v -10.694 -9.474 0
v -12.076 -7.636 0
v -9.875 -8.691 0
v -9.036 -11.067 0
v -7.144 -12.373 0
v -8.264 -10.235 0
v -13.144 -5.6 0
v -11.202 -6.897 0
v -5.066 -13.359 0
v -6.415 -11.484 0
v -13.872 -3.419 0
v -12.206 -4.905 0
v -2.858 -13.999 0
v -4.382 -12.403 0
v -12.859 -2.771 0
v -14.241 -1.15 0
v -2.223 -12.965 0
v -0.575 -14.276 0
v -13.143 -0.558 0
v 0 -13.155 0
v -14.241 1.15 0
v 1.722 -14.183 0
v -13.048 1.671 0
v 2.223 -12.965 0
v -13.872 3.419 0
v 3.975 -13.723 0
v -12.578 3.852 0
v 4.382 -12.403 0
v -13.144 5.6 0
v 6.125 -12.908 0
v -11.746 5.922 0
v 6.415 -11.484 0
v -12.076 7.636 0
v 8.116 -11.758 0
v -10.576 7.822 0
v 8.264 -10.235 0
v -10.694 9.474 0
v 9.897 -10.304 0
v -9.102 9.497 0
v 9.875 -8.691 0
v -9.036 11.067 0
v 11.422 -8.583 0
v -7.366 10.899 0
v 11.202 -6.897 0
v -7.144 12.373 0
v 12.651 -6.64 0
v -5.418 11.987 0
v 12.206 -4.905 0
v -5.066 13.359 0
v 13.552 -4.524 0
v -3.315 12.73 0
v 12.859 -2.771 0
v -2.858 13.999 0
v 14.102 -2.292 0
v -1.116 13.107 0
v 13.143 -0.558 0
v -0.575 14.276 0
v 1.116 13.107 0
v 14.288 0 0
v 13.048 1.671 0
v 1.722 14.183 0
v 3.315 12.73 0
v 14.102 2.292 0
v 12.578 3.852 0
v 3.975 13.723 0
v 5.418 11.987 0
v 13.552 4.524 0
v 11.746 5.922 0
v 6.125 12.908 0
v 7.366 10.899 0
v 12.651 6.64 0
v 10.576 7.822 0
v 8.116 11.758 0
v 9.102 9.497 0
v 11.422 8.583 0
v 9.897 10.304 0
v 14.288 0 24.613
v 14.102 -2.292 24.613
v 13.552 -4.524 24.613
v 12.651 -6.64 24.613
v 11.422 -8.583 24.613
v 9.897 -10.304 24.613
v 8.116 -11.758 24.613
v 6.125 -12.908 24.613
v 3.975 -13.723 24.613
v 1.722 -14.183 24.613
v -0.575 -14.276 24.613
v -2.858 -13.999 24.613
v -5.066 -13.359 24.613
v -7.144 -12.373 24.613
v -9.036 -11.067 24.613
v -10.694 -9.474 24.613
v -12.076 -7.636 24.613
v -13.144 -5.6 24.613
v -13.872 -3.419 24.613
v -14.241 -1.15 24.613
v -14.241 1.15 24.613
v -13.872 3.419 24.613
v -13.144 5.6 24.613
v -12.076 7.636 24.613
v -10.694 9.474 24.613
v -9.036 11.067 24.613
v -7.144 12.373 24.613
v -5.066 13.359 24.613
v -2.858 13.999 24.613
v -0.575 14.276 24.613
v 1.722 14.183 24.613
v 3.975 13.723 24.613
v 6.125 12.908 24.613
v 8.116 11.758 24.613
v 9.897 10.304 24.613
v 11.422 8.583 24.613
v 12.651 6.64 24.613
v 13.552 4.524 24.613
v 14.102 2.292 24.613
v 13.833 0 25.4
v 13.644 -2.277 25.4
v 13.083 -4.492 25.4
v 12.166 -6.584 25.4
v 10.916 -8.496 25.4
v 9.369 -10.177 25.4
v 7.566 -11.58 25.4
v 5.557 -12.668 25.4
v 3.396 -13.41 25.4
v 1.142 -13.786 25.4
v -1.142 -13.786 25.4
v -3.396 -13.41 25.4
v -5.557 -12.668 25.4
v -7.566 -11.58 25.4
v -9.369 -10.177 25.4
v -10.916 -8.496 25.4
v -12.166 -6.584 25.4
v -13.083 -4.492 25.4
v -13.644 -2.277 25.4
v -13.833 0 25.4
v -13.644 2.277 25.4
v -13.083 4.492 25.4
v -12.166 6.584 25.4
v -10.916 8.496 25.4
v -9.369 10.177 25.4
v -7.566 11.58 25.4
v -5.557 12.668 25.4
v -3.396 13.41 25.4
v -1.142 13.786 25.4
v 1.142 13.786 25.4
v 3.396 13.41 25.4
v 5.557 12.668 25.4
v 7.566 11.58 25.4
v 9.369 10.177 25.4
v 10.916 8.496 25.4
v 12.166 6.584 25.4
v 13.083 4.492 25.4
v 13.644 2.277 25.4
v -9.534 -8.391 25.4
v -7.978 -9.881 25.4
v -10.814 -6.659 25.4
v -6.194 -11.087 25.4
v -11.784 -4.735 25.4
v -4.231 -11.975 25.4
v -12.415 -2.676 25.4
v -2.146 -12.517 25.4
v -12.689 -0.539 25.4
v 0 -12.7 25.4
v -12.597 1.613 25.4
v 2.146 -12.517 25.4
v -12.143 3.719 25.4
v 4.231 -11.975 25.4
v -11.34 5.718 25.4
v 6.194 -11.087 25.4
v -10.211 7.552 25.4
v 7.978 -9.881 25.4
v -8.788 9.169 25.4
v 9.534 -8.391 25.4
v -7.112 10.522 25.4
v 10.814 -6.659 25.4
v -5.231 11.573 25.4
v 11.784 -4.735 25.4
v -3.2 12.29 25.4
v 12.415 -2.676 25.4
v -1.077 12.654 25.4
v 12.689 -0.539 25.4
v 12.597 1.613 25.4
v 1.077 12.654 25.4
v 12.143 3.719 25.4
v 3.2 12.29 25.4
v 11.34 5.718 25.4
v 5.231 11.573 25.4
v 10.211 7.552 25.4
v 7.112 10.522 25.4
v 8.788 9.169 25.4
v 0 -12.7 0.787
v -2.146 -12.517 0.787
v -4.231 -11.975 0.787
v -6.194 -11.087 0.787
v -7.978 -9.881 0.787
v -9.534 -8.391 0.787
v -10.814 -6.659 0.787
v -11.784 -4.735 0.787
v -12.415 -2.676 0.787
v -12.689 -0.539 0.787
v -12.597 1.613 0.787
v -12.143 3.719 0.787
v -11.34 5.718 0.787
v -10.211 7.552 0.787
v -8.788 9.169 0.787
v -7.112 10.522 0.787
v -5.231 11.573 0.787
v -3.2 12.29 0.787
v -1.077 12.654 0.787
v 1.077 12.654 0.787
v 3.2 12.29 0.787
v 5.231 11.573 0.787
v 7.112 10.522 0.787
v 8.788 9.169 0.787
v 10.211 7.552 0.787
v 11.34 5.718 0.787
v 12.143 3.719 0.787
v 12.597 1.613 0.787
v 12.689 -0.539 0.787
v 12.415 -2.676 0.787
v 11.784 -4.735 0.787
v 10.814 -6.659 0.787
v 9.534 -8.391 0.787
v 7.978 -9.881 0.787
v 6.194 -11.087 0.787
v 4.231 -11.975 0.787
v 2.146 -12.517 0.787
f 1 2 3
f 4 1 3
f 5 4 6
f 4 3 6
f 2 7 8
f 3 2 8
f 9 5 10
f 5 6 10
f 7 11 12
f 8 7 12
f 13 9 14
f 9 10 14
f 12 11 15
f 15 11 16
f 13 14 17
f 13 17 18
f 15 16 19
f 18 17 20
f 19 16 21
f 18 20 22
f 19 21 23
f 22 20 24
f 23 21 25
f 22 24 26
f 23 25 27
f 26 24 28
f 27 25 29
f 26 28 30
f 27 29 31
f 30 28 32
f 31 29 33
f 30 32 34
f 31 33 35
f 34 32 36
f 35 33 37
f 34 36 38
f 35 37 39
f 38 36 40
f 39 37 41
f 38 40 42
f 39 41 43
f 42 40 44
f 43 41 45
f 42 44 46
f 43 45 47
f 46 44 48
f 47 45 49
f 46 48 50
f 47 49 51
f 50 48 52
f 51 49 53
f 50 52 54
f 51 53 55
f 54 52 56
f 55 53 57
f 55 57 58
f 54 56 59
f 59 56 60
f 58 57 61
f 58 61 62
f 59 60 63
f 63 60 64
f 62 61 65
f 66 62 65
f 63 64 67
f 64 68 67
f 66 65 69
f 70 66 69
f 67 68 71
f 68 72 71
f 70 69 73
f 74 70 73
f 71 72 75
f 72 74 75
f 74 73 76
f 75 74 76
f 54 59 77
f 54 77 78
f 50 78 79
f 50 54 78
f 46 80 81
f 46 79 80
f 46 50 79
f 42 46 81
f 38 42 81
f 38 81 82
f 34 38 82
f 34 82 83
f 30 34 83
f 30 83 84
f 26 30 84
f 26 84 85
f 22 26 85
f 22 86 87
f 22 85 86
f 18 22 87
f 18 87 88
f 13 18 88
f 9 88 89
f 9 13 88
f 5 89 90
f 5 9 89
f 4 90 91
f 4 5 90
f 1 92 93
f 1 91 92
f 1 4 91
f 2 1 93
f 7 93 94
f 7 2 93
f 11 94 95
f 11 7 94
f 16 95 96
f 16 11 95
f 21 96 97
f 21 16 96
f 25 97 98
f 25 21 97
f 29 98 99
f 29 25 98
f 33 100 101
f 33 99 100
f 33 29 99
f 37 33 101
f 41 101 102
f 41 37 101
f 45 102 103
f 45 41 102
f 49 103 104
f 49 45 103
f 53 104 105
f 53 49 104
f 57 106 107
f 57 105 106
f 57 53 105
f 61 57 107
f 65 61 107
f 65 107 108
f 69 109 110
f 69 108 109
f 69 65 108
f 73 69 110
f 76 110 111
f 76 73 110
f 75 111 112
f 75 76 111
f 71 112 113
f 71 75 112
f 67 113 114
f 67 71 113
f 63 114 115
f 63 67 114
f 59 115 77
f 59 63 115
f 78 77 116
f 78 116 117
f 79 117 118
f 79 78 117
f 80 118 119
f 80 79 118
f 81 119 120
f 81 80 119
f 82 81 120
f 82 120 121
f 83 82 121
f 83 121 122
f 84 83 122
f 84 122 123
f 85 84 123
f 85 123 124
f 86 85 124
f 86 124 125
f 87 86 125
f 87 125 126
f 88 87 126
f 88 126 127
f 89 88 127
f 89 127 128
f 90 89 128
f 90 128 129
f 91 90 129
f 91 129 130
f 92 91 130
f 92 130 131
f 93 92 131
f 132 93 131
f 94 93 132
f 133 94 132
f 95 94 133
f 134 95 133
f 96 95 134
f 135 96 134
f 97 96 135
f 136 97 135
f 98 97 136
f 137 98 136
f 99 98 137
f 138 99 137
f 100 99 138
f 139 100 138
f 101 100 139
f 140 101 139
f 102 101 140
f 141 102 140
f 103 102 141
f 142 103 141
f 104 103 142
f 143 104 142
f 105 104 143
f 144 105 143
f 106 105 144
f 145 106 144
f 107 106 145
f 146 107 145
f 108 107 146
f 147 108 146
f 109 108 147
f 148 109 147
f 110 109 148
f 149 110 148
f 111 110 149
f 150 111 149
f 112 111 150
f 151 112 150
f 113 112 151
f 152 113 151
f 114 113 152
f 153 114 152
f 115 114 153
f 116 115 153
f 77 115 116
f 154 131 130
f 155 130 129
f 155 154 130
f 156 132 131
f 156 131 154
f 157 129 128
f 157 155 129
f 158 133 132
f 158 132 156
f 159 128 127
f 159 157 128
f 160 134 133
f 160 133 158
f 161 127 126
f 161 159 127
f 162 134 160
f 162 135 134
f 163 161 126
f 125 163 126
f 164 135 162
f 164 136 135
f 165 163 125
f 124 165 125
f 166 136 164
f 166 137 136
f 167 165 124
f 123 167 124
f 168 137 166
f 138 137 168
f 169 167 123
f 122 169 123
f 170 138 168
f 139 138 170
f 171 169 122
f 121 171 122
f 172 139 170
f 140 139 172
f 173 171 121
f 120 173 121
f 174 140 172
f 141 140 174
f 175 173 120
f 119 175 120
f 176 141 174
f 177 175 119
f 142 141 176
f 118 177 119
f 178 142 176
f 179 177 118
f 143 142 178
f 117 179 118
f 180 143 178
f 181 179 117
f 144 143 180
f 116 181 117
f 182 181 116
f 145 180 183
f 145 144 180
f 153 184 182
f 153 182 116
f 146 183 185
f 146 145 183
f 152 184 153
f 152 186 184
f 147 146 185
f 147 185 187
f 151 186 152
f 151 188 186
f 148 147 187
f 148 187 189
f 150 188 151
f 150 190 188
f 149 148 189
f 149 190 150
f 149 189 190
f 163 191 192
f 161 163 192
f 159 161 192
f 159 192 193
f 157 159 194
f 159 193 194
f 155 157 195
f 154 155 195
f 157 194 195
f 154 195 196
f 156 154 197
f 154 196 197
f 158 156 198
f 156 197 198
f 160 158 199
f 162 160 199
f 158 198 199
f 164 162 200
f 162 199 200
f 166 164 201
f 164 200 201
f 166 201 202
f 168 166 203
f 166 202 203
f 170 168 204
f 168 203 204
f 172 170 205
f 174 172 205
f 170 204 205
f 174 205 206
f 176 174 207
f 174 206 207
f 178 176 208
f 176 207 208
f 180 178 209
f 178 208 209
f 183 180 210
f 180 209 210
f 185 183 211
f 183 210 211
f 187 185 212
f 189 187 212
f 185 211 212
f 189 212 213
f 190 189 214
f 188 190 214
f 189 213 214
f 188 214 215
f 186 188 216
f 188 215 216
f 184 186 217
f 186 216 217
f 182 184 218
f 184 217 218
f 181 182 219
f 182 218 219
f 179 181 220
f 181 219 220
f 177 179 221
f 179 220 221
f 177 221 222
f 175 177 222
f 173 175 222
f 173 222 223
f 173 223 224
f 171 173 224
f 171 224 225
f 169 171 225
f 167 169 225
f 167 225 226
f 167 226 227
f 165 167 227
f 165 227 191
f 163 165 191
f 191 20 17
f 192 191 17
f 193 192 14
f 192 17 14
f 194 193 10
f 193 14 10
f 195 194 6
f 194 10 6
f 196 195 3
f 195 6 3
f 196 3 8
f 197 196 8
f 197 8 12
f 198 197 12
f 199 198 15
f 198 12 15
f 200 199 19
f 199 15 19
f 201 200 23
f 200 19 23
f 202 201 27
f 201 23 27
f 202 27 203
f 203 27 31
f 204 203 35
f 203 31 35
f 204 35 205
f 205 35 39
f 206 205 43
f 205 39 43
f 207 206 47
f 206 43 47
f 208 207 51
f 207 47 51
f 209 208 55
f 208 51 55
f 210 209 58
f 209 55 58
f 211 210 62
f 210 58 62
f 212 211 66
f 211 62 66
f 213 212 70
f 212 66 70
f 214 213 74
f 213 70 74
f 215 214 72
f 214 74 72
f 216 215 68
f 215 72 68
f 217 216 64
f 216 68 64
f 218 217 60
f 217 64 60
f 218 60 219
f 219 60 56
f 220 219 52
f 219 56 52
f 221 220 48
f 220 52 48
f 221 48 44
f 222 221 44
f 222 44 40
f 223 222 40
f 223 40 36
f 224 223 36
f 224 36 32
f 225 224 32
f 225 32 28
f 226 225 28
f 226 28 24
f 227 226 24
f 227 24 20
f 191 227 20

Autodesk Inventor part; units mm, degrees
ref_plane "YZ Plane" through (0, 0, 0) normal (1, 0, 0) x (0, 1, 0)
ref_plane "XZ Plane" through (0, 0, 0) normal (0, 1, 0) x (-1, 0, 0)
ref_plane "XY Plane" through (0, 0, 0) normal (0, 0, 1) x (1, 0, 0)
sketch "Sketch1" plane through (0, 0, 0) normal (0, 0, 1) x (1, 0, 0)
  circle A0 centre (0, 0) radius 14.2875
  dimension "d0" = 28.575
extrude "Body" add sketch "Sketch1" along normal blind 25.4
hole "Hole" at (0, 0, 25.4) direction (0, 0, -1) diameter 25.4 end through all
chamfer "Chamfer - Outside" distance 0.7874 angle 30 1 edges at (-14.2875, 0, 25.4) measured on face at (14.2412, -1.1497, 16.9333)
chamfer "Chamfer - Inside" distance 0.7874 angle 30 1 edges at (0, 12.7, 0) measured on face at (1.0219, -12.6588, 16.9333)
properties part number "JSI-1618-16" material "iglide J"
